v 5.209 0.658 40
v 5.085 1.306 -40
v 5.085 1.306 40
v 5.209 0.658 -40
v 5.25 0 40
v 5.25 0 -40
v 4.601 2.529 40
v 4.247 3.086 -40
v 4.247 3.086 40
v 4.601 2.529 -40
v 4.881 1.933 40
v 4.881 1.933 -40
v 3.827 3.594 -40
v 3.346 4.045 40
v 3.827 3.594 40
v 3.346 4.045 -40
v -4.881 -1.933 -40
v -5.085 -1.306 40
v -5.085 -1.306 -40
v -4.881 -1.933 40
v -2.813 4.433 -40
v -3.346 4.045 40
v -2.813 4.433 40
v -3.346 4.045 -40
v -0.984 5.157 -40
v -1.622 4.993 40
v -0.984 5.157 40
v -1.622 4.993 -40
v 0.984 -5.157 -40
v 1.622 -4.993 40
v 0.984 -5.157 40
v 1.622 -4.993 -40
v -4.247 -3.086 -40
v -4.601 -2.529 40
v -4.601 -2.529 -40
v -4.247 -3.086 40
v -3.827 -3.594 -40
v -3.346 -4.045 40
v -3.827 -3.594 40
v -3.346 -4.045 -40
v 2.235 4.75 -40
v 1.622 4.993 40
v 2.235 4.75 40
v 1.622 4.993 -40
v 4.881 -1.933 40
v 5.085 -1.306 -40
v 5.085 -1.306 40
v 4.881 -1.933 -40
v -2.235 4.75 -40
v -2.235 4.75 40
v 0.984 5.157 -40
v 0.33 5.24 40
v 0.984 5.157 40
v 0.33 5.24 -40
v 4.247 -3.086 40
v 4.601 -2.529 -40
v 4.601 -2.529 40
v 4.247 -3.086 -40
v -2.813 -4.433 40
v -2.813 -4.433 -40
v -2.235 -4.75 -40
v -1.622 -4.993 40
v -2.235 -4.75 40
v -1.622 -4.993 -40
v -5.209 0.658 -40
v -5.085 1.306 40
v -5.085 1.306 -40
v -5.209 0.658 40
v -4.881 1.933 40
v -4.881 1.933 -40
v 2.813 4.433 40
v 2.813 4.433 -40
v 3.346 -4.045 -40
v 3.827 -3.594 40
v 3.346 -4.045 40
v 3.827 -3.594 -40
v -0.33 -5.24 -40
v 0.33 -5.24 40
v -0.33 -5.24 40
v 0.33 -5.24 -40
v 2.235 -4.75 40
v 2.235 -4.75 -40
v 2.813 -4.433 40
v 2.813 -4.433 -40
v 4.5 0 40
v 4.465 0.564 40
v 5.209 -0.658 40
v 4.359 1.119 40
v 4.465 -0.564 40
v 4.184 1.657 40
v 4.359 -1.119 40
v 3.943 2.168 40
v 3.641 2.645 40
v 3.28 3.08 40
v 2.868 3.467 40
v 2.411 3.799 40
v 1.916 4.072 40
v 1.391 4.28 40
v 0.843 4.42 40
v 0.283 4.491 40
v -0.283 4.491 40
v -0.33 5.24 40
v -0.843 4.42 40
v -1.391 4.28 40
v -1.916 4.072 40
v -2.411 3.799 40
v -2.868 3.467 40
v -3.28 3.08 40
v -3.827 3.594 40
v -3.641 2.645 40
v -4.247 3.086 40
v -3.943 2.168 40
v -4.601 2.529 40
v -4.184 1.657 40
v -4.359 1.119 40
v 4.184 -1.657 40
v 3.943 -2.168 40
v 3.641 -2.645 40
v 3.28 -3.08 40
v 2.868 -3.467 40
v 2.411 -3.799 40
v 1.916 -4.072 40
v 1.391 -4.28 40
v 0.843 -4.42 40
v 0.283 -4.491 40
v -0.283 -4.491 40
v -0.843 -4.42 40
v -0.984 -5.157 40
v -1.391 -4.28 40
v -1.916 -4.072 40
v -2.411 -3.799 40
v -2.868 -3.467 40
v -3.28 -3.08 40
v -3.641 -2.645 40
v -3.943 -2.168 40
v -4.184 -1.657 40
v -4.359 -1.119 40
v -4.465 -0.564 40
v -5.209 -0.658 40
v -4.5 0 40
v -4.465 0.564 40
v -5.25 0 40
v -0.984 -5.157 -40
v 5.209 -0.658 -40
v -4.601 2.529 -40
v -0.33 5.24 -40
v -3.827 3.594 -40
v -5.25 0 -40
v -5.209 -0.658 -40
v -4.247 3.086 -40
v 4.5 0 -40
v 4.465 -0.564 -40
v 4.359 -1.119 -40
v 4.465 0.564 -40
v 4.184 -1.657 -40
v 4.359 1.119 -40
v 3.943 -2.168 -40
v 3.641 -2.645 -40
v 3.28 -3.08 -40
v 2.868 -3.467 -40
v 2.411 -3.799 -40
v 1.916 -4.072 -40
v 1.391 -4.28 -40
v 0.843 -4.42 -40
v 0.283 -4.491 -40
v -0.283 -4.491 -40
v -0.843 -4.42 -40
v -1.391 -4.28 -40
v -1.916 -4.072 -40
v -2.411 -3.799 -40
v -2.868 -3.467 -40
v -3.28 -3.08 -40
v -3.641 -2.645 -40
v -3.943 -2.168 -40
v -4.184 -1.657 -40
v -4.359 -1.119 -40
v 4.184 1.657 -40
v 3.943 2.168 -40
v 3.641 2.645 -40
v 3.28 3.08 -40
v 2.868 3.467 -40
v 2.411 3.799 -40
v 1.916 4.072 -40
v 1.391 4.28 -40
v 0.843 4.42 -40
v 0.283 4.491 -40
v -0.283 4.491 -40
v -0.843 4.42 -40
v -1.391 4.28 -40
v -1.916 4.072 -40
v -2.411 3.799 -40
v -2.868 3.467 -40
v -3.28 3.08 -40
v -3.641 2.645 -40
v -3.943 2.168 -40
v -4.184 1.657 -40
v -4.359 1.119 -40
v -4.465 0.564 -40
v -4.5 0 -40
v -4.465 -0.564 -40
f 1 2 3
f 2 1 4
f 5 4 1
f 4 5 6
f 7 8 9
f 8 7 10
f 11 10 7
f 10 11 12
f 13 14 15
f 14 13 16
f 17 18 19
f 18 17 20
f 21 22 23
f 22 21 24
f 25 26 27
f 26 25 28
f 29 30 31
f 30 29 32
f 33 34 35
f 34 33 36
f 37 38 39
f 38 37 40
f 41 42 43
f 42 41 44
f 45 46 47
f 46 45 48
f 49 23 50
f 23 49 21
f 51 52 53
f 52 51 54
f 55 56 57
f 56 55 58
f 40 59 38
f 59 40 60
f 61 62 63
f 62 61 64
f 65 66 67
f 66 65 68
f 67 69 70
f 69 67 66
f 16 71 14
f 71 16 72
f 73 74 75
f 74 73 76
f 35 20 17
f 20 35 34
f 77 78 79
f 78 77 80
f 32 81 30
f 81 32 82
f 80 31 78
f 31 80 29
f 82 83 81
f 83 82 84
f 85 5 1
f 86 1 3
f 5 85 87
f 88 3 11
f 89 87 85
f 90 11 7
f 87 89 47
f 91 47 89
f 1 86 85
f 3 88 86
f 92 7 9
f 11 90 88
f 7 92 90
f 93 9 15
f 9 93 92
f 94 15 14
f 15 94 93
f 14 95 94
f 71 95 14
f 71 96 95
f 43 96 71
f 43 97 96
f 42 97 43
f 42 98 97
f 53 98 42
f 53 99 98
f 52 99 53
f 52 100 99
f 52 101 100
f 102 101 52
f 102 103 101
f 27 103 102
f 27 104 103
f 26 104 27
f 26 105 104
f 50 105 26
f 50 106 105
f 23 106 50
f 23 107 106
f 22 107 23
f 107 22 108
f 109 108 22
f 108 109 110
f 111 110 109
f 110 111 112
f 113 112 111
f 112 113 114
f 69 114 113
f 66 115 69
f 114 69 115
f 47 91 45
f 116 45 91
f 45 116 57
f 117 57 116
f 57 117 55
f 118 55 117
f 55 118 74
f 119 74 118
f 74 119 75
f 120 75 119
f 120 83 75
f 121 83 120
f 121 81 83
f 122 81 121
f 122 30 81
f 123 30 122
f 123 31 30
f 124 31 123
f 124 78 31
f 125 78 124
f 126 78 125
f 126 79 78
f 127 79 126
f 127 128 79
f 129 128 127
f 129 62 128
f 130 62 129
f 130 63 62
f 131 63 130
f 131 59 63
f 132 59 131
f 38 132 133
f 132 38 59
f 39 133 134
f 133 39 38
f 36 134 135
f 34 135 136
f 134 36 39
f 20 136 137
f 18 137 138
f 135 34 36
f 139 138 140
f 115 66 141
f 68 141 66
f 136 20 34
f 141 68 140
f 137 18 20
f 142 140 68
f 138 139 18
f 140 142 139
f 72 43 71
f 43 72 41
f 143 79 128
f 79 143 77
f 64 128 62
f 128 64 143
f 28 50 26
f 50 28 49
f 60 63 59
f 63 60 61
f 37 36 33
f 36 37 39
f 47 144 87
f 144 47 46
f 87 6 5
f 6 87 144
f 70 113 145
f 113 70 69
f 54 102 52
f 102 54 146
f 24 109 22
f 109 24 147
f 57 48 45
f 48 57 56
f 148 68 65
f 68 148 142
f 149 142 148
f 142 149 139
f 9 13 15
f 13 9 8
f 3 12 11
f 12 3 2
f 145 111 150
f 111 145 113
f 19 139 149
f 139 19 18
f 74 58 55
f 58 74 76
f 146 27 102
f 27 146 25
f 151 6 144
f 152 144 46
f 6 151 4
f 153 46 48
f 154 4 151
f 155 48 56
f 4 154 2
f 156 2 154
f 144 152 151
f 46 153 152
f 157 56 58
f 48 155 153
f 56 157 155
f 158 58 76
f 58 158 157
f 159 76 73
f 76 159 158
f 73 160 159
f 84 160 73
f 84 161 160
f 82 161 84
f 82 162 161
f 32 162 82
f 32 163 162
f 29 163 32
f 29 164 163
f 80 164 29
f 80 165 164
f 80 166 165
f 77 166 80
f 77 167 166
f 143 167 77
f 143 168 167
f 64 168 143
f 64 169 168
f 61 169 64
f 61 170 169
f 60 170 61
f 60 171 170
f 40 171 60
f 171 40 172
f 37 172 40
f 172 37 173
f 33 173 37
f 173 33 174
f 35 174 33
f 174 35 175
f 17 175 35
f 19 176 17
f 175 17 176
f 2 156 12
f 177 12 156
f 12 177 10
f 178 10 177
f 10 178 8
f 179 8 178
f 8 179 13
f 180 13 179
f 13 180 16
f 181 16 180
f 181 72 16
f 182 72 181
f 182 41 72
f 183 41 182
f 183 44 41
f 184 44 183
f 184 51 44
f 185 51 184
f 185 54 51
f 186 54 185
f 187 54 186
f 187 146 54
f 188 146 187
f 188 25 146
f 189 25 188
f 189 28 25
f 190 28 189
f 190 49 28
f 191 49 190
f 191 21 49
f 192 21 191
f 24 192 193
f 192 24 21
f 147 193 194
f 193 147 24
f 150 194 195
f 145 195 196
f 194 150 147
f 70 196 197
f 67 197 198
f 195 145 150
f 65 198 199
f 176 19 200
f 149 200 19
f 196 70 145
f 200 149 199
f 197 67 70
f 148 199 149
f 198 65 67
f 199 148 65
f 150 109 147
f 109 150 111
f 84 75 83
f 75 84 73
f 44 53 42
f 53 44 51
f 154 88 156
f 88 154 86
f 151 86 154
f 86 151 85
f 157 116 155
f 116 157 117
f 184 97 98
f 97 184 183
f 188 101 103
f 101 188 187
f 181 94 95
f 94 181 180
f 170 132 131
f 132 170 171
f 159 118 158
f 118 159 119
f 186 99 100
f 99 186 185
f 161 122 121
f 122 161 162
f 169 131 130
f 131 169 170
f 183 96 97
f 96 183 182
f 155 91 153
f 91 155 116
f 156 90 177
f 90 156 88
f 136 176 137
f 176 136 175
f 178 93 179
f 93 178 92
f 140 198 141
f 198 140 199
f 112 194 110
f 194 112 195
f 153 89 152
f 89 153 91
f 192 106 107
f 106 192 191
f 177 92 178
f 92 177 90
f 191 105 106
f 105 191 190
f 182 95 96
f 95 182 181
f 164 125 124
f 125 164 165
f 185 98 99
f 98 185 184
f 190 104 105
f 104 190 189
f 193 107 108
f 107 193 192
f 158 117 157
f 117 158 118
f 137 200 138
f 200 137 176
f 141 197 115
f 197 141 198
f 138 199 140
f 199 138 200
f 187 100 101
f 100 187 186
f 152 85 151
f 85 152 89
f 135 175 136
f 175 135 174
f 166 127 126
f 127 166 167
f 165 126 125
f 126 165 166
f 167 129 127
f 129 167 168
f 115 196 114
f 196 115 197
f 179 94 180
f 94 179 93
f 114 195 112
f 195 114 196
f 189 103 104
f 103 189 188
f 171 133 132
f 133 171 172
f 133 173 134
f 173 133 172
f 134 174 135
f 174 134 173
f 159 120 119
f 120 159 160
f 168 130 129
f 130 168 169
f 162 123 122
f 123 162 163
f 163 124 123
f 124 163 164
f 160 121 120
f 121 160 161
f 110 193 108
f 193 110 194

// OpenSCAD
$fn = 50;


difference() {
	union() {
		translate(v = [0, 0, -40.0000000000]) {
			cylinder(h = 80, r = 5.2500000000);
		}
	}
	union() {
		translate(v = [0, 0, -100.0000000000]) {
			cylinder(h = 200, r = 4.5000000000);
		}
	}
}
